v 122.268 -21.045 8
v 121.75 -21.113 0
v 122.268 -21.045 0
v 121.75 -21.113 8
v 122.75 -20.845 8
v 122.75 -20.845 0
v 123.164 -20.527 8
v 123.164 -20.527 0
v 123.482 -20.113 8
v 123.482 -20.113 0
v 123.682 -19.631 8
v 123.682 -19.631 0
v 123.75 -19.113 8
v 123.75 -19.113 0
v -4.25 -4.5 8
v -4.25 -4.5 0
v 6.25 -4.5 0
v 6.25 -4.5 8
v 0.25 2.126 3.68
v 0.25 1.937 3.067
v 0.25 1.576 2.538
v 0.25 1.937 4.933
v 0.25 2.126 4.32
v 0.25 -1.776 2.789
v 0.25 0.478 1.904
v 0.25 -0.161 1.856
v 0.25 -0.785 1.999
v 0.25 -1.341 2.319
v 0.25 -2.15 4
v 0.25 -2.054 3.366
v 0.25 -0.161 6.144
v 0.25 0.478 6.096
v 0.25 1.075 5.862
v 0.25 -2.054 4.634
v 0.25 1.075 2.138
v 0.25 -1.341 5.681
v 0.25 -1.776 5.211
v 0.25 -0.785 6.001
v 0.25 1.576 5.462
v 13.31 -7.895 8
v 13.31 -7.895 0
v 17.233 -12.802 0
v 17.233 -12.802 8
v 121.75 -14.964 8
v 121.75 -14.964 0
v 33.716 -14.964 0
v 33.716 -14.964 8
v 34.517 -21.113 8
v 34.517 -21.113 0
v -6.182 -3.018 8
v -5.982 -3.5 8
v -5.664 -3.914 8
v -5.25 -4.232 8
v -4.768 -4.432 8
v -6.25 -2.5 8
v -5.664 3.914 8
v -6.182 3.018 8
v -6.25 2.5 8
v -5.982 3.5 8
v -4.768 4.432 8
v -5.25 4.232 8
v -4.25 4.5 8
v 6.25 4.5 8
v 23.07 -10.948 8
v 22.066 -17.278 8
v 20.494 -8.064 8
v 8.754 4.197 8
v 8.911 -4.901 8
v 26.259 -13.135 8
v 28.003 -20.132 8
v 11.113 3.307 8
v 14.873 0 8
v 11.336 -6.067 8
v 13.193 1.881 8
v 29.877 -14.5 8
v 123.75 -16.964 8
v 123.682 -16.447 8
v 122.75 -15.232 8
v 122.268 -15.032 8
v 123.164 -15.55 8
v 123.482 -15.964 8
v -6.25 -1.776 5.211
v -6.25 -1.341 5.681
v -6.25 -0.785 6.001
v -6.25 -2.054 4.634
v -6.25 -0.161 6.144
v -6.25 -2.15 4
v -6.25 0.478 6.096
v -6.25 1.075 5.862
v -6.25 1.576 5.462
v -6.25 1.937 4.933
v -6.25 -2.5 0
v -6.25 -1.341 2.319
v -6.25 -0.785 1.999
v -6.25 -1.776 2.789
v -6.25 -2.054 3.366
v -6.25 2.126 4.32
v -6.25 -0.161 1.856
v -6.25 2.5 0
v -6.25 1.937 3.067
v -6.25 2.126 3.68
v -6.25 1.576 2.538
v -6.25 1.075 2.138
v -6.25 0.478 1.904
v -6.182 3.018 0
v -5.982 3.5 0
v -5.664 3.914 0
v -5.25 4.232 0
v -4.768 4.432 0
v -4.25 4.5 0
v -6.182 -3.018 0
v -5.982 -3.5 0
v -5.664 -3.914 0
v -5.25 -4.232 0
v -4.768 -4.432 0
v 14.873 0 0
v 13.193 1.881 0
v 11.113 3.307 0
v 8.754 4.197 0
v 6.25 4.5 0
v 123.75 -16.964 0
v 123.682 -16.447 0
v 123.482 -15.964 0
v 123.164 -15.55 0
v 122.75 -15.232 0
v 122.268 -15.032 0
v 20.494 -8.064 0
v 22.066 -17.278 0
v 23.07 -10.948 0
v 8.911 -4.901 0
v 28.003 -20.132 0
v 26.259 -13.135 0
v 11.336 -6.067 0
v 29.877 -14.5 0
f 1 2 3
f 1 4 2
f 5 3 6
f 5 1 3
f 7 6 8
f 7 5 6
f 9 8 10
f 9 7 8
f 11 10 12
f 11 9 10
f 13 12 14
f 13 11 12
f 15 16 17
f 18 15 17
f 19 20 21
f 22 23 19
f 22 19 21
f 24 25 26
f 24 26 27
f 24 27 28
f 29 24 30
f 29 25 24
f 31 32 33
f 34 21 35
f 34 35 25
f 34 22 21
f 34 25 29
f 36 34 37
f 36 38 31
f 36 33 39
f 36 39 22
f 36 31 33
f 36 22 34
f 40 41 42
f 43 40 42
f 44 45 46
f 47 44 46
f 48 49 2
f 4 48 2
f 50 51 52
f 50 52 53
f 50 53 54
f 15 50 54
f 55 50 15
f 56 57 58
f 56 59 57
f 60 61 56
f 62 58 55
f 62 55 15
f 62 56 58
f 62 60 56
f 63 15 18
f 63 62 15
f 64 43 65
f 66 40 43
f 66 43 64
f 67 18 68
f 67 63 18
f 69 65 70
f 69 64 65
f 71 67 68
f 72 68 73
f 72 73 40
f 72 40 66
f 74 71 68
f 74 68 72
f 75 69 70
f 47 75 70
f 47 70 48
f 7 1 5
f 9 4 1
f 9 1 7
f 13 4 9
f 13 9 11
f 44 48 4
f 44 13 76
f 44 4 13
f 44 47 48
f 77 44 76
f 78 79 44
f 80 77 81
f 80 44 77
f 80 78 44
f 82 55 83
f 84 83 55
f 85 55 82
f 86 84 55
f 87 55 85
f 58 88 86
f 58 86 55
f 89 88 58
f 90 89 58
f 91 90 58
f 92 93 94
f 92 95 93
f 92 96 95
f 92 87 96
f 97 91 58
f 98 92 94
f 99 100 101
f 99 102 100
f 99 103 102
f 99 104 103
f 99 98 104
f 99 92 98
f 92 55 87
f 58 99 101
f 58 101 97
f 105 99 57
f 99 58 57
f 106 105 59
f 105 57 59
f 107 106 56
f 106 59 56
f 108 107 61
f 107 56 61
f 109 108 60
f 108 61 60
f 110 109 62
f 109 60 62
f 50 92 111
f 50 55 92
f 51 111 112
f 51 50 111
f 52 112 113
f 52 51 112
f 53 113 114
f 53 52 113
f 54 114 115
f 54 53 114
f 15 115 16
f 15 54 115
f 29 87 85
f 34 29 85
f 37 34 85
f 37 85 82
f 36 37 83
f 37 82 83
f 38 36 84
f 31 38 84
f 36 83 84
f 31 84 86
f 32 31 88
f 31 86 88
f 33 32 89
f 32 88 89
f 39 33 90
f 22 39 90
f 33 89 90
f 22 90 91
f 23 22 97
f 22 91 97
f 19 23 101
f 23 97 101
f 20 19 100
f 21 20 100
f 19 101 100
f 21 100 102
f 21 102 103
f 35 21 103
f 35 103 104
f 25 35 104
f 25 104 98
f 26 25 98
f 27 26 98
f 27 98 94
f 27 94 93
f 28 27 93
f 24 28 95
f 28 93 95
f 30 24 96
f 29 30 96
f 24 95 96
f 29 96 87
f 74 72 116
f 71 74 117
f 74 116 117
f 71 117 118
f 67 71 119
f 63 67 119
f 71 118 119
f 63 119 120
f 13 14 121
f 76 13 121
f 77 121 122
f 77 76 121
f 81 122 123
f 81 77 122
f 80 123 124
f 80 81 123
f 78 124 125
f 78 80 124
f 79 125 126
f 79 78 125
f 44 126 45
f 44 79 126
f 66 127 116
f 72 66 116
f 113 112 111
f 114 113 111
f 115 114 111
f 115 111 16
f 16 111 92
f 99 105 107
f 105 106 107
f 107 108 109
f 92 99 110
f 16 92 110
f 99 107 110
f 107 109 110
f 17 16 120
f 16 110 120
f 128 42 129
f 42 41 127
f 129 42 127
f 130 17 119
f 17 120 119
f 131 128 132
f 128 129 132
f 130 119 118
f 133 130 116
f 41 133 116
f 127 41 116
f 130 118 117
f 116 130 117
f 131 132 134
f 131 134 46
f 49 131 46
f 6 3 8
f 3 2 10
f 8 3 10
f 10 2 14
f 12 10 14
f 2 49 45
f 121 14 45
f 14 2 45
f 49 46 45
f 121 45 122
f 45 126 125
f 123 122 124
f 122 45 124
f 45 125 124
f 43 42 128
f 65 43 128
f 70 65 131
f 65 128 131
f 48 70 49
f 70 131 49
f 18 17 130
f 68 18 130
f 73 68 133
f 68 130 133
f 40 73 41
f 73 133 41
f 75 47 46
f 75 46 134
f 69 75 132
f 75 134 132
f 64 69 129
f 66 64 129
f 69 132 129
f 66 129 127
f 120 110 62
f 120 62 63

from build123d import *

# Parameters (mm, degrees)
F0_W     = 12.5
F0_H     = 9
F1_DEPTH = 8
F2_R     = 2.15
F3_DEPTH = 6.5
F4_R     = 2


with BuildPart() as f1:
    # F0 (on Top) → F1 (new body)
    with BuildSketch(Plane.XY):
        Rectangle(F0_W, F0_H)
        with BuildLine():
            ThreePointArc((14.872505, 0), (11.113065, 3.307334), (6.25, 4.5))
            Line((6.25, 4.5), (6.25, -4.5))
            ThreePointArc((6.25, -4.5), (10.167104, -5.392854), (13.310355, -7.895026))
            Line((13.310355, -7.895026), (17.232623, -12.801666))
            ThreePointArc((17.232623, -12.801666), (24.927557, -18.927186), (34.516945, -21.112965))
            Line((34.516945, -21.112965), (123.75, -21.112965))
            Line((123.75, -21.112965), (123.75, -14.964157))
            Line((123.75, -14.964157), (33.715505, -14.964157))
            ThreePointArc((33.715505, -14.964157), (26.258617, -13.135356), (20.493996, -8.063982))
            Line((20.493996, -8.063982), (14.872505, 0))
        make_face()
    extrude(amount=F1_DEPTH)

    # F2 (on face) → F3 (cut)
    with BuildSketch(Plane(origin=(-6.25, 0, 0), x_dir=(0, -1, 0), z_dir=(-1, 0, 0))):
        with Locations((0, 4)):
            Circle(F2_R)
    extrude(amount=-F3_DEPTH, mode=Mode.SUBTRACT)

    # F4
    f4_edges = [f1.edges().sort_by_distance(p)[0] for p in [
        (-6.25, -4.5, 4),
        (123.75, -21.112965, 4),
        (123.75, -14.964157, 4),
        (-6.25, 4.5, 4),
    ]]
    fillet(f4_edges, radius=F4_R)


solid = f1.part
